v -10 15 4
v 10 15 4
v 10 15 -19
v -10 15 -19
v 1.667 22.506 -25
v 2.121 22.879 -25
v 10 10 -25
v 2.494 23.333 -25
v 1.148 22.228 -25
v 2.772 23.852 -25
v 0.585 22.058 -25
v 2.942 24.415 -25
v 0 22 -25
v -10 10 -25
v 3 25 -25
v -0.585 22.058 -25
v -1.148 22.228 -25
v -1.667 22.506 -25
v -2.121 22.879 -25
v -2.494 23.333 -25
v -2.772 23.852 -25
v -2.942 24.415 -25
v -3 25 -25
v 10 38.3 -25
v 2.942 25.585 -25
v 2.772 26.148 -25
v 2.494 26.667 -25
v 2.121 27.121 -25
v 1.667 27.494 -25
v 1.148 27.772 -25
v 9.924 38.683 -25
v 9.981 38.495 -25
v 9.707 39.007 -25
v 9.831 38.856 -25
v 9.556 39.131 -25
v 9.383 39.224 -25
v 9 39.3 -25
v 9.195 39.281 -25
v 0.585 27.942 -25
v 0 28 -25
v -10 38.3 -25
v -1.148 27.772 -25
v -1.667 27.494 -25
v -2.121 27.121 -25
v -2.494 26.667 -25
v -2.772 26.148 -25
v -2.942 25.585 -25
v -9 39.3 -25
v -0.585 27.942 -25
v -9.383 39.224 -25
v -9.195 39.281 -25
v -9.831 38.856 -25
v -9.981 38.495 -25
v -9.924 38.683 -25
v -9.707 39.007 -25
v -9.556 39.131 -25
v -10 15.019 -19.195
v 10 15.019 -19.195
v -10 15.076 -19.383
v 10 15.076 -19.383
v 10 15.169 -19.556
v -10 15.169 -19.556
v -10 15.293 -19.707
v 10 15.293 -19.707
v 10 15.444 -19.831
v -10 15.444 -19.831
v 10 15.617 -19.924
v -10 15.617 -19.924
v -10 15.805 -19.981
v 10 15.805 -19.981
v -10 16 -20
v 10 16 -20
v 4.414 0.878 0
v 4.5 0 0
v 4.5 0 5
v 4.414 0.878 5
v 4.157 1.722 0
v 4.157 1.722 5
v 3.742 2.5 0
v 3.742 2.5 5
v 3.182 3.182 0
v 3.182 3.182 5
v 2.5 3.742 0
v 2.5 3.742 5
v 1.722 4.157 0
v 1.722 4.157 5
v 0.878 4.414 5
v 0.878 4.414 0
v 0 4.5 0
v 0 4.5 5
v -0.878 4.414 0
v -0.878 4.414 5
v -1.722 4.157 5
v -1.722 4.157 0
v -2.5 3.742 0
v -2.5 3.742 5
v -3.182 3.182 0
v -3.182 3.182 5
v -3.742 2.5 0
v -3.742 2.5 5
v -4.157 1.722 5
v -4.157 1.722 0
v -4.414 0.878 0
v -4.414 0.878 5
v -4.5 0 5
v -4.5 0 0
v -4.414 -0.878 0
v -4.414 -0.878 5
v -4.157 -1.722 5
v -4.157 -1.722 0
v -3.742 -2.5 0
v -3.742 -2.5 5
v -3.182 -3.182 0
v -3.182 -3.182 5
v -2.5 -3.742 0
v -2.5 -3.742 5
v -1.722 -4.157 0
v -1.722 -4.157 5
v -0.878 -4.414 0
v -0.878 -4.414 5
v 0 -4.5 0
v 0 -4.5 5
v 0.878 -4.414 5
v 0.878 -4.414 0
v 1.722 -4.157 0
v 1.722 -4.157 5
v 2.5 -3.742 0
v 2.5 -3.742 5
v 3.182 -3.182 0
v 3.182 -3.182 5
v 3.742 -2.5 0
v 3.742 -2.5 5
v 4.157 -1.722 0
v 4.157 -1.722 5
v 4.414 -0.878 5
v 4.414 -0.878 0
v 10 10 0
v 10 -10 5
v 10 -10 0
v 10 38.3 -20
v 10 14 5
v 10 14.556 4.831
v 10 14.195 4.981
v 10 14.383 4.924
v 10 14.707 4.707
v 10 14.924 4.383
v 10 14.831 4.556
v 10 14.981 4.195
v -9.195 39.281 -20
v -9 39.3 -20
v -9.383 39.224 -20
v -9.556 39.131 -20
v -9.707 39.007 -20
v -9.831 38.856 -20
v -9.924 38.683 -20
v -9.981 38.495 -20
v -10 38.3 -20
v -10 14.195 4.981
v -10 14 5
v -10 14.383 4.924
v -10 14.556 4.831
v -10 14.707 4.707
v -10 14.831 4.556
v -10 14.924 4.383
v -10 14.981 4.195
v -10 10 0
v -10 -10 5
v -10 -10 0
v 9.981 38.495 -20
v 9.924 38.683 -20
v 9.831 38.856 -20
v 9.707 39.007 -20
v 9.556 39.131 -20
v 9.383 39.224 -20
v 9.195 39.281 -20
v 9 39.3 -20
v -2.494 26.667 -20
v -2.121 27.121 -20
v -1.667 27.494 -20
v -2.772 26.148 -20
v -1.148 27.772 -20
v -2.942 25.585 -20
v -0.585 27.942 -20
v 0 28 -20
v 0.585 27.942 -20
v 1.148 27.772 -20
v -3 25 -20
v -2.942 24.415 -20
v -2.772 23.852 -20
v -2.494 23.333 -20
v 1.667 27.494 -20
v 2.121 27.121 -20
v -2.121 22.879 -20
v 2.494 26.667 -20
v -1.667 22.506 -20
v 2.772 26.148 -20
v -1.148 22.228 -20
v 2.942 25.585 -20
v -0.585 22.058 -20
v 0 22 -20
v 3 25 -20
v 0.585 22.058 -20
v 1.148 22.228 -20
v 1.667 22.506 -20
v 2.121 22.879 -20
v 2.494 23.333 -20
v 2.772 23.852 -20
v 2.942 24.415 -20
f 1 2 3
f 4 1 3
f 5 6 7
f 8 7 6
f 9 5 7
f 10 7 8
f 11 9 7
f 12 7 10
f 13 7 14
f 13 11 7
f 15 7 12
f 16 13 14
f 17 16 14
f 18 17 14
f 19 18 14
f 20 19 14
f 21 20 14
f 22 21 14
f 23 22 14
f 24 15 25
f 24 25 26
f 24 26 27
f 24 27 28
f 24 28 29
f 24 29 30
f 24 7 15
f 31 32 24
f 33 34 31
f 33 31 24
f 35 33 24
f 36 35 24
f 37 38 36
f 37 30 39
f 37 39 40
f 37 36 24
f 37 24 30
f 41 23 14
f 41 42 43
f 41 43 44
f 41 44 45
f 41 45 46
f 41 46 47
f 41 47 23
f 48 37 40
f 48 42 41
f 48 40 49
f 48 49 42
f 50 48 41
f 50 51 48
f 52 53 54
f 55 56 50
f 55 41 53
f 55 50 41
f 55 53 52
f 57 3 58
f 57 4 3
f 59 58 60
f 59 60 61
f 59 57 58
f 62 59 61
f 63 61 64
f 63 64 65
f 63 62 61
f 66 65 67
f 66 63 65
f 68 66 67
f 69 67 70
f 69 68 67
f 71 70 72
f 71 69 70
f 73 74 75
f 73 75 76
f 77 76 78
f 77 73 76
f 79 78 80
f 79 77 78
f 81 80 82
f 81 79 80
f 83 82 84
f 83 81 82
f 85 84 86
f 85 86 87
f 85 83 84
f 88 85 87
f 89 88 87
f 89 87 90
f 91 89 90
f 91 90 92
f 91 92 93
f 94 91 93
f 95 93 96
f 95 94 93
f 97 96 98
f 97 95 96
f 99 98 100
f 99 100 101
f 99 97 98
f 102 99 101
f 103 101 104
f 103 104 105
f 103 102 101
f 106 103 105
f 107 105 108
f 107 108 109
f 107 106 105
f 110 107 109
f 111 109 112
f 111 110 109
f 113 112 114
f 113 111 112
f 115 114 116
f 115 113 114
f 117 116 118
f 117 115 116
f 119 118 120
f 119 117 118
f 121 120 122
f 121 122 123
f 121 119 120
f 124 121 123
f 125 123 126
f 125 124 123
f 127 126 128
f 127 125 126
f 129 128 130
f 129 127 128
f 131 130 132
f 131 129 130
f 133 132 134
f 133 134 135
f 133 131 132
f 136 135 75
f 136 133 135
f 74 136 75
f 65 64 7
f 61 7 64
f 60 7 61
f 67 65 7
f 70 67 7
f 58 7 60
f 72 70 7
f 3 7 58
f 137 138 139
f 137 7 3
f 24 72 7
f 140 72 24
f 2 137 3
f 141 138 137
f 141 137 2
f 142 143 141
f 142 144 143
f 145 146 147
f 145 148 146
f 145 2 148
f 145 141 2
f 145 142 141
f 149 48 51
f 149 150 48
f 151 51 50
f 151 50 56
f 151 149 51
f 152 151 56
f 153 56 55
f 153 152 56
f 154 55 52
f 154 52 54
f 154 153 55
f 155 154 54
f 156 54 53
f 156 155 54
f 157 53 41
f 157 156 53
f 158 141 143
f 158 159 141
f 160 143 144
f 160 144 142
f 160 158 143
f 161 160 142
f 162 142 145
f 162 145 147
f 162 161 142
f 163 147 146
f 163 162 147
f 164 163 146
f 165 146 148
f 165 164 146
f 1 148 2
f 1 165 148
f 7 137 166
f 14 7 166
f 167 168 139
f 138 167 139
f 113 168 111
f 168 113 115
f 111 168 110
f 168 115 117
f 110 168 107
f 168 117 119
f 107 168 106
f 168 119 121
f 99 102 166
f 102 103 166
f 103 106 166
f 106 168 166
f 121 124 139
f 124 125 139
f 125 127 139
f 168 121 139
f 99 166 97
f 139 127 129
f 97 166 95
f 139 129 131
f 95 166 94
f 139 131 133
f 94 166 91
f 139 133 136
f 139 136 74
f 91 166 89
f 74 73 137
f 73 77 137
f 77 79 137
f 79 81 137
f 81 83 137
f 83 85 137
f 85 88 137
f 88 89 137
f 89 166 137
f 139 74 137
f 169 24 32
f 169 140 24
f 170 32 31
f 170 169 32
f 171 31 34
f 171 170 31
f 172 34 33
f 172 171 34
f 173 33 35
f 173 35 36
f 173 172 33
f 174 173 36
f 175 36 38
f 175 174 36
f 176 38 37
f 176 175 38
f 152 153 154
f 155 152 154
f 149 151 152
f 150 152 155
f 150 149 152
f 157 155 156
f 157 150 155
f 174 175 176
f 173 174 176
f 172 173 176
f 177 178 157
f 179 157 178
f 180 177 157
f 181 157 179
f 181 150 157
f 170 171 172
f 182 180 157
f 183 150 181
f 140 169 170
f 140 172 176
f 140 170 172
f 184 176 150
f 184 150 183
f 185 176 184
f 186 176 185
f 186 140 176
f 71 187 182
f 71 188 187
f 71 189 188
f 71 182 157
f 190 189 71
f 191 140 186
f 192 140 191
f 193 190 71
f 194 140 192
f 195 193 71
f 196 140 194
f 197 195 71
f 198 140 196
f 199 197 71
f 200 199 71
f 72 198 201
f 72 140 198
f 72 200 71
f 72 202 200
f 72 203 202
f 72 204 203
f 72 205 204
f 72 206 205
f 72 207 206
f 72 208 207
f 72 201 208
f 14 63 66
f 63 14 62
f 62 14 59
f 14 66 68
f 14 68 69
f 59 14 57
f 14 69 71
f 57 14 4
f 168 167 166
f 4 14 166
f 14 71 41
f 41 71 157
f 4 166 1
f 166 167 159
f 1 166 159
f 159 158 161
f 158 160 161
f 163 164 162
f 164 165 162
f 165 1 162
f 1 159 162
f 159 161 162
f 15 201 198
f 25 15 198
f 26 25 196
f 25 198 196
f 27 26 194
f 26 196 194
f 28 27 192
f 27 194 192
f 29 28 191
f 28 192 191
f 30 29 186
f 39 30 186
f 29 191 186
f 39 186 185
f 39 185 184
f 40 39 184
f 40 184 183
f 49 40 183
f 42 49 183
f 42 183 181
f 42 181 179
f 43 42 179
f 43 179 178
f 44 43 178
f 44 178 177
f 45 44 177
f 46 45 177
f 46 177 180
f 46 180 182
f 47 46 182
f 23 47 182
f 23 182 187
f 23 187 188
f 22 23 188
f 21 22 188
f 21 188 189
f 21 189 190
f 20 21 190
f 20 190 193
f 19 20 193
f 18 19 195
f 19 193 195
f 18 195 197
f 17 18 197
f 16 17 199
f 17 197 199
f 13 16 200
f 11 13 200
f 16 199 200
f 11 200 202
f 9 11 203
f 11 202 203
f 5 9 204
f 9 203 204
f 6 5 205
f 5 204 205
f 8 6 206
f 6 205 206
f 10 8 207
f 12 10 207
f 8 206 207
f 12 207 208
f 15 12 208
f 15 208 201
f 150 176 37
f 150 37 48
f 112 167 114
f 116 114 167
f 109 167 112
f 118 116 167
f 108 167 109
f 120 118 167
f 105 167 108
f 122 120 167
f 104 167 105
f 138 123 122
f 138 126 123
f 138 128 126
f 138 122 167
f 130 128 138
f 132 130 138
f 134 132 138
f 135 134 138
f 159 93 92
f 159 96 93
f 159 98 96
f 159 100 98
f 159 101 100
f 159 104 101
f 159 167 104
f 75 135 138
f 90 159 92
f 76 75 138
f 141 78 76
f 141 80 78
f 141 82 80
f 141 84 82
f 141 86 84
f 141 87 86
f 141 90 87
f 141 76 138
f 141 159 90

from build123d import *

# Parameters (mm, degrees)
SKETCH1_R           = 4.5
BOSS_EXTRUDE1_DEPTH = 5
SKETCH2_W           = 20
SKETCH2_H           = 29.3
BOSS_EXTRUDE2_DEPTH = 25
CUT_EXTRUDE1_DEPTH  = 30
SKETCH4_R           = 2.5
SKETCH4_R_2         = 3
CUT_EXTRUDE2_DEPTH  = 30
FILLET2_R           = 1


with BuildPart() as part:
    # Sketch1 → Boss-Extrude1 (new body)
    with BuildSketch(Plane.XY):
        Polygon((-10, 10), (-10, -10), (10, -10), (10, 10), (10, 39.3), (-10, 39.3), align=None)
        Circle(SKETCH1_R, mode=Mode.SUBTRACT)
    extrude(amount=BOSS_EXTRUDE1_DEPTH)

    # Sketch2 → Boss-Extrude2 (add)
    with BuildSketch(Plane(origin=(0, 0, 0), x_dir=(-1, 0, 0), z_dir=(0, 0, -1))):
        with Locations((0, 24.65)):
            Rectangle(SKETCH2_W, SKETCH2_H)
    extrude(amount=BOSS_EXTRUDE2_DEPTH)

    # Sketch3 → Cut-Extrude1 (cut)
    with BuildSketch(Plane(origin=(10, 0, 0), x_dir=(0, 0, -1), z_dir=(1, 0, 0))):
        Polygon((0, 15), (-5, 15), (-5, 39.3), (20, 39.3), (20, 15), align=None)
    extrude(amount=-CUT_EXTRUDE1_DEPTH, mode=Mode.SUBTRACT)

    # Sketch4 → Cut-Extrude2 (cut)
    with BuildSketch(Plane.XY.offset(-20)):
        with Locations((0, 45)):
            Circle(SKETCH4_R)
        with Locations((0, 25)):
            Circle(SKETCH4_R_2)
    extrude(amount=-CUT_EXTRUDE2_DEPTH, mode=Mode.SUBTRACT)

    # Fillet2
    fillet2_edges = [part.edges().sort_by_distance(p)[0] for p in [
        (-10, 39.3, -22.5),
        (10, 39.3, -22.5),
        (0, 15, -20),
        (0, 15, 5),
    ]]
    fillet(fillet2_edges, radius=FILLET2_R)


solid = part.part
